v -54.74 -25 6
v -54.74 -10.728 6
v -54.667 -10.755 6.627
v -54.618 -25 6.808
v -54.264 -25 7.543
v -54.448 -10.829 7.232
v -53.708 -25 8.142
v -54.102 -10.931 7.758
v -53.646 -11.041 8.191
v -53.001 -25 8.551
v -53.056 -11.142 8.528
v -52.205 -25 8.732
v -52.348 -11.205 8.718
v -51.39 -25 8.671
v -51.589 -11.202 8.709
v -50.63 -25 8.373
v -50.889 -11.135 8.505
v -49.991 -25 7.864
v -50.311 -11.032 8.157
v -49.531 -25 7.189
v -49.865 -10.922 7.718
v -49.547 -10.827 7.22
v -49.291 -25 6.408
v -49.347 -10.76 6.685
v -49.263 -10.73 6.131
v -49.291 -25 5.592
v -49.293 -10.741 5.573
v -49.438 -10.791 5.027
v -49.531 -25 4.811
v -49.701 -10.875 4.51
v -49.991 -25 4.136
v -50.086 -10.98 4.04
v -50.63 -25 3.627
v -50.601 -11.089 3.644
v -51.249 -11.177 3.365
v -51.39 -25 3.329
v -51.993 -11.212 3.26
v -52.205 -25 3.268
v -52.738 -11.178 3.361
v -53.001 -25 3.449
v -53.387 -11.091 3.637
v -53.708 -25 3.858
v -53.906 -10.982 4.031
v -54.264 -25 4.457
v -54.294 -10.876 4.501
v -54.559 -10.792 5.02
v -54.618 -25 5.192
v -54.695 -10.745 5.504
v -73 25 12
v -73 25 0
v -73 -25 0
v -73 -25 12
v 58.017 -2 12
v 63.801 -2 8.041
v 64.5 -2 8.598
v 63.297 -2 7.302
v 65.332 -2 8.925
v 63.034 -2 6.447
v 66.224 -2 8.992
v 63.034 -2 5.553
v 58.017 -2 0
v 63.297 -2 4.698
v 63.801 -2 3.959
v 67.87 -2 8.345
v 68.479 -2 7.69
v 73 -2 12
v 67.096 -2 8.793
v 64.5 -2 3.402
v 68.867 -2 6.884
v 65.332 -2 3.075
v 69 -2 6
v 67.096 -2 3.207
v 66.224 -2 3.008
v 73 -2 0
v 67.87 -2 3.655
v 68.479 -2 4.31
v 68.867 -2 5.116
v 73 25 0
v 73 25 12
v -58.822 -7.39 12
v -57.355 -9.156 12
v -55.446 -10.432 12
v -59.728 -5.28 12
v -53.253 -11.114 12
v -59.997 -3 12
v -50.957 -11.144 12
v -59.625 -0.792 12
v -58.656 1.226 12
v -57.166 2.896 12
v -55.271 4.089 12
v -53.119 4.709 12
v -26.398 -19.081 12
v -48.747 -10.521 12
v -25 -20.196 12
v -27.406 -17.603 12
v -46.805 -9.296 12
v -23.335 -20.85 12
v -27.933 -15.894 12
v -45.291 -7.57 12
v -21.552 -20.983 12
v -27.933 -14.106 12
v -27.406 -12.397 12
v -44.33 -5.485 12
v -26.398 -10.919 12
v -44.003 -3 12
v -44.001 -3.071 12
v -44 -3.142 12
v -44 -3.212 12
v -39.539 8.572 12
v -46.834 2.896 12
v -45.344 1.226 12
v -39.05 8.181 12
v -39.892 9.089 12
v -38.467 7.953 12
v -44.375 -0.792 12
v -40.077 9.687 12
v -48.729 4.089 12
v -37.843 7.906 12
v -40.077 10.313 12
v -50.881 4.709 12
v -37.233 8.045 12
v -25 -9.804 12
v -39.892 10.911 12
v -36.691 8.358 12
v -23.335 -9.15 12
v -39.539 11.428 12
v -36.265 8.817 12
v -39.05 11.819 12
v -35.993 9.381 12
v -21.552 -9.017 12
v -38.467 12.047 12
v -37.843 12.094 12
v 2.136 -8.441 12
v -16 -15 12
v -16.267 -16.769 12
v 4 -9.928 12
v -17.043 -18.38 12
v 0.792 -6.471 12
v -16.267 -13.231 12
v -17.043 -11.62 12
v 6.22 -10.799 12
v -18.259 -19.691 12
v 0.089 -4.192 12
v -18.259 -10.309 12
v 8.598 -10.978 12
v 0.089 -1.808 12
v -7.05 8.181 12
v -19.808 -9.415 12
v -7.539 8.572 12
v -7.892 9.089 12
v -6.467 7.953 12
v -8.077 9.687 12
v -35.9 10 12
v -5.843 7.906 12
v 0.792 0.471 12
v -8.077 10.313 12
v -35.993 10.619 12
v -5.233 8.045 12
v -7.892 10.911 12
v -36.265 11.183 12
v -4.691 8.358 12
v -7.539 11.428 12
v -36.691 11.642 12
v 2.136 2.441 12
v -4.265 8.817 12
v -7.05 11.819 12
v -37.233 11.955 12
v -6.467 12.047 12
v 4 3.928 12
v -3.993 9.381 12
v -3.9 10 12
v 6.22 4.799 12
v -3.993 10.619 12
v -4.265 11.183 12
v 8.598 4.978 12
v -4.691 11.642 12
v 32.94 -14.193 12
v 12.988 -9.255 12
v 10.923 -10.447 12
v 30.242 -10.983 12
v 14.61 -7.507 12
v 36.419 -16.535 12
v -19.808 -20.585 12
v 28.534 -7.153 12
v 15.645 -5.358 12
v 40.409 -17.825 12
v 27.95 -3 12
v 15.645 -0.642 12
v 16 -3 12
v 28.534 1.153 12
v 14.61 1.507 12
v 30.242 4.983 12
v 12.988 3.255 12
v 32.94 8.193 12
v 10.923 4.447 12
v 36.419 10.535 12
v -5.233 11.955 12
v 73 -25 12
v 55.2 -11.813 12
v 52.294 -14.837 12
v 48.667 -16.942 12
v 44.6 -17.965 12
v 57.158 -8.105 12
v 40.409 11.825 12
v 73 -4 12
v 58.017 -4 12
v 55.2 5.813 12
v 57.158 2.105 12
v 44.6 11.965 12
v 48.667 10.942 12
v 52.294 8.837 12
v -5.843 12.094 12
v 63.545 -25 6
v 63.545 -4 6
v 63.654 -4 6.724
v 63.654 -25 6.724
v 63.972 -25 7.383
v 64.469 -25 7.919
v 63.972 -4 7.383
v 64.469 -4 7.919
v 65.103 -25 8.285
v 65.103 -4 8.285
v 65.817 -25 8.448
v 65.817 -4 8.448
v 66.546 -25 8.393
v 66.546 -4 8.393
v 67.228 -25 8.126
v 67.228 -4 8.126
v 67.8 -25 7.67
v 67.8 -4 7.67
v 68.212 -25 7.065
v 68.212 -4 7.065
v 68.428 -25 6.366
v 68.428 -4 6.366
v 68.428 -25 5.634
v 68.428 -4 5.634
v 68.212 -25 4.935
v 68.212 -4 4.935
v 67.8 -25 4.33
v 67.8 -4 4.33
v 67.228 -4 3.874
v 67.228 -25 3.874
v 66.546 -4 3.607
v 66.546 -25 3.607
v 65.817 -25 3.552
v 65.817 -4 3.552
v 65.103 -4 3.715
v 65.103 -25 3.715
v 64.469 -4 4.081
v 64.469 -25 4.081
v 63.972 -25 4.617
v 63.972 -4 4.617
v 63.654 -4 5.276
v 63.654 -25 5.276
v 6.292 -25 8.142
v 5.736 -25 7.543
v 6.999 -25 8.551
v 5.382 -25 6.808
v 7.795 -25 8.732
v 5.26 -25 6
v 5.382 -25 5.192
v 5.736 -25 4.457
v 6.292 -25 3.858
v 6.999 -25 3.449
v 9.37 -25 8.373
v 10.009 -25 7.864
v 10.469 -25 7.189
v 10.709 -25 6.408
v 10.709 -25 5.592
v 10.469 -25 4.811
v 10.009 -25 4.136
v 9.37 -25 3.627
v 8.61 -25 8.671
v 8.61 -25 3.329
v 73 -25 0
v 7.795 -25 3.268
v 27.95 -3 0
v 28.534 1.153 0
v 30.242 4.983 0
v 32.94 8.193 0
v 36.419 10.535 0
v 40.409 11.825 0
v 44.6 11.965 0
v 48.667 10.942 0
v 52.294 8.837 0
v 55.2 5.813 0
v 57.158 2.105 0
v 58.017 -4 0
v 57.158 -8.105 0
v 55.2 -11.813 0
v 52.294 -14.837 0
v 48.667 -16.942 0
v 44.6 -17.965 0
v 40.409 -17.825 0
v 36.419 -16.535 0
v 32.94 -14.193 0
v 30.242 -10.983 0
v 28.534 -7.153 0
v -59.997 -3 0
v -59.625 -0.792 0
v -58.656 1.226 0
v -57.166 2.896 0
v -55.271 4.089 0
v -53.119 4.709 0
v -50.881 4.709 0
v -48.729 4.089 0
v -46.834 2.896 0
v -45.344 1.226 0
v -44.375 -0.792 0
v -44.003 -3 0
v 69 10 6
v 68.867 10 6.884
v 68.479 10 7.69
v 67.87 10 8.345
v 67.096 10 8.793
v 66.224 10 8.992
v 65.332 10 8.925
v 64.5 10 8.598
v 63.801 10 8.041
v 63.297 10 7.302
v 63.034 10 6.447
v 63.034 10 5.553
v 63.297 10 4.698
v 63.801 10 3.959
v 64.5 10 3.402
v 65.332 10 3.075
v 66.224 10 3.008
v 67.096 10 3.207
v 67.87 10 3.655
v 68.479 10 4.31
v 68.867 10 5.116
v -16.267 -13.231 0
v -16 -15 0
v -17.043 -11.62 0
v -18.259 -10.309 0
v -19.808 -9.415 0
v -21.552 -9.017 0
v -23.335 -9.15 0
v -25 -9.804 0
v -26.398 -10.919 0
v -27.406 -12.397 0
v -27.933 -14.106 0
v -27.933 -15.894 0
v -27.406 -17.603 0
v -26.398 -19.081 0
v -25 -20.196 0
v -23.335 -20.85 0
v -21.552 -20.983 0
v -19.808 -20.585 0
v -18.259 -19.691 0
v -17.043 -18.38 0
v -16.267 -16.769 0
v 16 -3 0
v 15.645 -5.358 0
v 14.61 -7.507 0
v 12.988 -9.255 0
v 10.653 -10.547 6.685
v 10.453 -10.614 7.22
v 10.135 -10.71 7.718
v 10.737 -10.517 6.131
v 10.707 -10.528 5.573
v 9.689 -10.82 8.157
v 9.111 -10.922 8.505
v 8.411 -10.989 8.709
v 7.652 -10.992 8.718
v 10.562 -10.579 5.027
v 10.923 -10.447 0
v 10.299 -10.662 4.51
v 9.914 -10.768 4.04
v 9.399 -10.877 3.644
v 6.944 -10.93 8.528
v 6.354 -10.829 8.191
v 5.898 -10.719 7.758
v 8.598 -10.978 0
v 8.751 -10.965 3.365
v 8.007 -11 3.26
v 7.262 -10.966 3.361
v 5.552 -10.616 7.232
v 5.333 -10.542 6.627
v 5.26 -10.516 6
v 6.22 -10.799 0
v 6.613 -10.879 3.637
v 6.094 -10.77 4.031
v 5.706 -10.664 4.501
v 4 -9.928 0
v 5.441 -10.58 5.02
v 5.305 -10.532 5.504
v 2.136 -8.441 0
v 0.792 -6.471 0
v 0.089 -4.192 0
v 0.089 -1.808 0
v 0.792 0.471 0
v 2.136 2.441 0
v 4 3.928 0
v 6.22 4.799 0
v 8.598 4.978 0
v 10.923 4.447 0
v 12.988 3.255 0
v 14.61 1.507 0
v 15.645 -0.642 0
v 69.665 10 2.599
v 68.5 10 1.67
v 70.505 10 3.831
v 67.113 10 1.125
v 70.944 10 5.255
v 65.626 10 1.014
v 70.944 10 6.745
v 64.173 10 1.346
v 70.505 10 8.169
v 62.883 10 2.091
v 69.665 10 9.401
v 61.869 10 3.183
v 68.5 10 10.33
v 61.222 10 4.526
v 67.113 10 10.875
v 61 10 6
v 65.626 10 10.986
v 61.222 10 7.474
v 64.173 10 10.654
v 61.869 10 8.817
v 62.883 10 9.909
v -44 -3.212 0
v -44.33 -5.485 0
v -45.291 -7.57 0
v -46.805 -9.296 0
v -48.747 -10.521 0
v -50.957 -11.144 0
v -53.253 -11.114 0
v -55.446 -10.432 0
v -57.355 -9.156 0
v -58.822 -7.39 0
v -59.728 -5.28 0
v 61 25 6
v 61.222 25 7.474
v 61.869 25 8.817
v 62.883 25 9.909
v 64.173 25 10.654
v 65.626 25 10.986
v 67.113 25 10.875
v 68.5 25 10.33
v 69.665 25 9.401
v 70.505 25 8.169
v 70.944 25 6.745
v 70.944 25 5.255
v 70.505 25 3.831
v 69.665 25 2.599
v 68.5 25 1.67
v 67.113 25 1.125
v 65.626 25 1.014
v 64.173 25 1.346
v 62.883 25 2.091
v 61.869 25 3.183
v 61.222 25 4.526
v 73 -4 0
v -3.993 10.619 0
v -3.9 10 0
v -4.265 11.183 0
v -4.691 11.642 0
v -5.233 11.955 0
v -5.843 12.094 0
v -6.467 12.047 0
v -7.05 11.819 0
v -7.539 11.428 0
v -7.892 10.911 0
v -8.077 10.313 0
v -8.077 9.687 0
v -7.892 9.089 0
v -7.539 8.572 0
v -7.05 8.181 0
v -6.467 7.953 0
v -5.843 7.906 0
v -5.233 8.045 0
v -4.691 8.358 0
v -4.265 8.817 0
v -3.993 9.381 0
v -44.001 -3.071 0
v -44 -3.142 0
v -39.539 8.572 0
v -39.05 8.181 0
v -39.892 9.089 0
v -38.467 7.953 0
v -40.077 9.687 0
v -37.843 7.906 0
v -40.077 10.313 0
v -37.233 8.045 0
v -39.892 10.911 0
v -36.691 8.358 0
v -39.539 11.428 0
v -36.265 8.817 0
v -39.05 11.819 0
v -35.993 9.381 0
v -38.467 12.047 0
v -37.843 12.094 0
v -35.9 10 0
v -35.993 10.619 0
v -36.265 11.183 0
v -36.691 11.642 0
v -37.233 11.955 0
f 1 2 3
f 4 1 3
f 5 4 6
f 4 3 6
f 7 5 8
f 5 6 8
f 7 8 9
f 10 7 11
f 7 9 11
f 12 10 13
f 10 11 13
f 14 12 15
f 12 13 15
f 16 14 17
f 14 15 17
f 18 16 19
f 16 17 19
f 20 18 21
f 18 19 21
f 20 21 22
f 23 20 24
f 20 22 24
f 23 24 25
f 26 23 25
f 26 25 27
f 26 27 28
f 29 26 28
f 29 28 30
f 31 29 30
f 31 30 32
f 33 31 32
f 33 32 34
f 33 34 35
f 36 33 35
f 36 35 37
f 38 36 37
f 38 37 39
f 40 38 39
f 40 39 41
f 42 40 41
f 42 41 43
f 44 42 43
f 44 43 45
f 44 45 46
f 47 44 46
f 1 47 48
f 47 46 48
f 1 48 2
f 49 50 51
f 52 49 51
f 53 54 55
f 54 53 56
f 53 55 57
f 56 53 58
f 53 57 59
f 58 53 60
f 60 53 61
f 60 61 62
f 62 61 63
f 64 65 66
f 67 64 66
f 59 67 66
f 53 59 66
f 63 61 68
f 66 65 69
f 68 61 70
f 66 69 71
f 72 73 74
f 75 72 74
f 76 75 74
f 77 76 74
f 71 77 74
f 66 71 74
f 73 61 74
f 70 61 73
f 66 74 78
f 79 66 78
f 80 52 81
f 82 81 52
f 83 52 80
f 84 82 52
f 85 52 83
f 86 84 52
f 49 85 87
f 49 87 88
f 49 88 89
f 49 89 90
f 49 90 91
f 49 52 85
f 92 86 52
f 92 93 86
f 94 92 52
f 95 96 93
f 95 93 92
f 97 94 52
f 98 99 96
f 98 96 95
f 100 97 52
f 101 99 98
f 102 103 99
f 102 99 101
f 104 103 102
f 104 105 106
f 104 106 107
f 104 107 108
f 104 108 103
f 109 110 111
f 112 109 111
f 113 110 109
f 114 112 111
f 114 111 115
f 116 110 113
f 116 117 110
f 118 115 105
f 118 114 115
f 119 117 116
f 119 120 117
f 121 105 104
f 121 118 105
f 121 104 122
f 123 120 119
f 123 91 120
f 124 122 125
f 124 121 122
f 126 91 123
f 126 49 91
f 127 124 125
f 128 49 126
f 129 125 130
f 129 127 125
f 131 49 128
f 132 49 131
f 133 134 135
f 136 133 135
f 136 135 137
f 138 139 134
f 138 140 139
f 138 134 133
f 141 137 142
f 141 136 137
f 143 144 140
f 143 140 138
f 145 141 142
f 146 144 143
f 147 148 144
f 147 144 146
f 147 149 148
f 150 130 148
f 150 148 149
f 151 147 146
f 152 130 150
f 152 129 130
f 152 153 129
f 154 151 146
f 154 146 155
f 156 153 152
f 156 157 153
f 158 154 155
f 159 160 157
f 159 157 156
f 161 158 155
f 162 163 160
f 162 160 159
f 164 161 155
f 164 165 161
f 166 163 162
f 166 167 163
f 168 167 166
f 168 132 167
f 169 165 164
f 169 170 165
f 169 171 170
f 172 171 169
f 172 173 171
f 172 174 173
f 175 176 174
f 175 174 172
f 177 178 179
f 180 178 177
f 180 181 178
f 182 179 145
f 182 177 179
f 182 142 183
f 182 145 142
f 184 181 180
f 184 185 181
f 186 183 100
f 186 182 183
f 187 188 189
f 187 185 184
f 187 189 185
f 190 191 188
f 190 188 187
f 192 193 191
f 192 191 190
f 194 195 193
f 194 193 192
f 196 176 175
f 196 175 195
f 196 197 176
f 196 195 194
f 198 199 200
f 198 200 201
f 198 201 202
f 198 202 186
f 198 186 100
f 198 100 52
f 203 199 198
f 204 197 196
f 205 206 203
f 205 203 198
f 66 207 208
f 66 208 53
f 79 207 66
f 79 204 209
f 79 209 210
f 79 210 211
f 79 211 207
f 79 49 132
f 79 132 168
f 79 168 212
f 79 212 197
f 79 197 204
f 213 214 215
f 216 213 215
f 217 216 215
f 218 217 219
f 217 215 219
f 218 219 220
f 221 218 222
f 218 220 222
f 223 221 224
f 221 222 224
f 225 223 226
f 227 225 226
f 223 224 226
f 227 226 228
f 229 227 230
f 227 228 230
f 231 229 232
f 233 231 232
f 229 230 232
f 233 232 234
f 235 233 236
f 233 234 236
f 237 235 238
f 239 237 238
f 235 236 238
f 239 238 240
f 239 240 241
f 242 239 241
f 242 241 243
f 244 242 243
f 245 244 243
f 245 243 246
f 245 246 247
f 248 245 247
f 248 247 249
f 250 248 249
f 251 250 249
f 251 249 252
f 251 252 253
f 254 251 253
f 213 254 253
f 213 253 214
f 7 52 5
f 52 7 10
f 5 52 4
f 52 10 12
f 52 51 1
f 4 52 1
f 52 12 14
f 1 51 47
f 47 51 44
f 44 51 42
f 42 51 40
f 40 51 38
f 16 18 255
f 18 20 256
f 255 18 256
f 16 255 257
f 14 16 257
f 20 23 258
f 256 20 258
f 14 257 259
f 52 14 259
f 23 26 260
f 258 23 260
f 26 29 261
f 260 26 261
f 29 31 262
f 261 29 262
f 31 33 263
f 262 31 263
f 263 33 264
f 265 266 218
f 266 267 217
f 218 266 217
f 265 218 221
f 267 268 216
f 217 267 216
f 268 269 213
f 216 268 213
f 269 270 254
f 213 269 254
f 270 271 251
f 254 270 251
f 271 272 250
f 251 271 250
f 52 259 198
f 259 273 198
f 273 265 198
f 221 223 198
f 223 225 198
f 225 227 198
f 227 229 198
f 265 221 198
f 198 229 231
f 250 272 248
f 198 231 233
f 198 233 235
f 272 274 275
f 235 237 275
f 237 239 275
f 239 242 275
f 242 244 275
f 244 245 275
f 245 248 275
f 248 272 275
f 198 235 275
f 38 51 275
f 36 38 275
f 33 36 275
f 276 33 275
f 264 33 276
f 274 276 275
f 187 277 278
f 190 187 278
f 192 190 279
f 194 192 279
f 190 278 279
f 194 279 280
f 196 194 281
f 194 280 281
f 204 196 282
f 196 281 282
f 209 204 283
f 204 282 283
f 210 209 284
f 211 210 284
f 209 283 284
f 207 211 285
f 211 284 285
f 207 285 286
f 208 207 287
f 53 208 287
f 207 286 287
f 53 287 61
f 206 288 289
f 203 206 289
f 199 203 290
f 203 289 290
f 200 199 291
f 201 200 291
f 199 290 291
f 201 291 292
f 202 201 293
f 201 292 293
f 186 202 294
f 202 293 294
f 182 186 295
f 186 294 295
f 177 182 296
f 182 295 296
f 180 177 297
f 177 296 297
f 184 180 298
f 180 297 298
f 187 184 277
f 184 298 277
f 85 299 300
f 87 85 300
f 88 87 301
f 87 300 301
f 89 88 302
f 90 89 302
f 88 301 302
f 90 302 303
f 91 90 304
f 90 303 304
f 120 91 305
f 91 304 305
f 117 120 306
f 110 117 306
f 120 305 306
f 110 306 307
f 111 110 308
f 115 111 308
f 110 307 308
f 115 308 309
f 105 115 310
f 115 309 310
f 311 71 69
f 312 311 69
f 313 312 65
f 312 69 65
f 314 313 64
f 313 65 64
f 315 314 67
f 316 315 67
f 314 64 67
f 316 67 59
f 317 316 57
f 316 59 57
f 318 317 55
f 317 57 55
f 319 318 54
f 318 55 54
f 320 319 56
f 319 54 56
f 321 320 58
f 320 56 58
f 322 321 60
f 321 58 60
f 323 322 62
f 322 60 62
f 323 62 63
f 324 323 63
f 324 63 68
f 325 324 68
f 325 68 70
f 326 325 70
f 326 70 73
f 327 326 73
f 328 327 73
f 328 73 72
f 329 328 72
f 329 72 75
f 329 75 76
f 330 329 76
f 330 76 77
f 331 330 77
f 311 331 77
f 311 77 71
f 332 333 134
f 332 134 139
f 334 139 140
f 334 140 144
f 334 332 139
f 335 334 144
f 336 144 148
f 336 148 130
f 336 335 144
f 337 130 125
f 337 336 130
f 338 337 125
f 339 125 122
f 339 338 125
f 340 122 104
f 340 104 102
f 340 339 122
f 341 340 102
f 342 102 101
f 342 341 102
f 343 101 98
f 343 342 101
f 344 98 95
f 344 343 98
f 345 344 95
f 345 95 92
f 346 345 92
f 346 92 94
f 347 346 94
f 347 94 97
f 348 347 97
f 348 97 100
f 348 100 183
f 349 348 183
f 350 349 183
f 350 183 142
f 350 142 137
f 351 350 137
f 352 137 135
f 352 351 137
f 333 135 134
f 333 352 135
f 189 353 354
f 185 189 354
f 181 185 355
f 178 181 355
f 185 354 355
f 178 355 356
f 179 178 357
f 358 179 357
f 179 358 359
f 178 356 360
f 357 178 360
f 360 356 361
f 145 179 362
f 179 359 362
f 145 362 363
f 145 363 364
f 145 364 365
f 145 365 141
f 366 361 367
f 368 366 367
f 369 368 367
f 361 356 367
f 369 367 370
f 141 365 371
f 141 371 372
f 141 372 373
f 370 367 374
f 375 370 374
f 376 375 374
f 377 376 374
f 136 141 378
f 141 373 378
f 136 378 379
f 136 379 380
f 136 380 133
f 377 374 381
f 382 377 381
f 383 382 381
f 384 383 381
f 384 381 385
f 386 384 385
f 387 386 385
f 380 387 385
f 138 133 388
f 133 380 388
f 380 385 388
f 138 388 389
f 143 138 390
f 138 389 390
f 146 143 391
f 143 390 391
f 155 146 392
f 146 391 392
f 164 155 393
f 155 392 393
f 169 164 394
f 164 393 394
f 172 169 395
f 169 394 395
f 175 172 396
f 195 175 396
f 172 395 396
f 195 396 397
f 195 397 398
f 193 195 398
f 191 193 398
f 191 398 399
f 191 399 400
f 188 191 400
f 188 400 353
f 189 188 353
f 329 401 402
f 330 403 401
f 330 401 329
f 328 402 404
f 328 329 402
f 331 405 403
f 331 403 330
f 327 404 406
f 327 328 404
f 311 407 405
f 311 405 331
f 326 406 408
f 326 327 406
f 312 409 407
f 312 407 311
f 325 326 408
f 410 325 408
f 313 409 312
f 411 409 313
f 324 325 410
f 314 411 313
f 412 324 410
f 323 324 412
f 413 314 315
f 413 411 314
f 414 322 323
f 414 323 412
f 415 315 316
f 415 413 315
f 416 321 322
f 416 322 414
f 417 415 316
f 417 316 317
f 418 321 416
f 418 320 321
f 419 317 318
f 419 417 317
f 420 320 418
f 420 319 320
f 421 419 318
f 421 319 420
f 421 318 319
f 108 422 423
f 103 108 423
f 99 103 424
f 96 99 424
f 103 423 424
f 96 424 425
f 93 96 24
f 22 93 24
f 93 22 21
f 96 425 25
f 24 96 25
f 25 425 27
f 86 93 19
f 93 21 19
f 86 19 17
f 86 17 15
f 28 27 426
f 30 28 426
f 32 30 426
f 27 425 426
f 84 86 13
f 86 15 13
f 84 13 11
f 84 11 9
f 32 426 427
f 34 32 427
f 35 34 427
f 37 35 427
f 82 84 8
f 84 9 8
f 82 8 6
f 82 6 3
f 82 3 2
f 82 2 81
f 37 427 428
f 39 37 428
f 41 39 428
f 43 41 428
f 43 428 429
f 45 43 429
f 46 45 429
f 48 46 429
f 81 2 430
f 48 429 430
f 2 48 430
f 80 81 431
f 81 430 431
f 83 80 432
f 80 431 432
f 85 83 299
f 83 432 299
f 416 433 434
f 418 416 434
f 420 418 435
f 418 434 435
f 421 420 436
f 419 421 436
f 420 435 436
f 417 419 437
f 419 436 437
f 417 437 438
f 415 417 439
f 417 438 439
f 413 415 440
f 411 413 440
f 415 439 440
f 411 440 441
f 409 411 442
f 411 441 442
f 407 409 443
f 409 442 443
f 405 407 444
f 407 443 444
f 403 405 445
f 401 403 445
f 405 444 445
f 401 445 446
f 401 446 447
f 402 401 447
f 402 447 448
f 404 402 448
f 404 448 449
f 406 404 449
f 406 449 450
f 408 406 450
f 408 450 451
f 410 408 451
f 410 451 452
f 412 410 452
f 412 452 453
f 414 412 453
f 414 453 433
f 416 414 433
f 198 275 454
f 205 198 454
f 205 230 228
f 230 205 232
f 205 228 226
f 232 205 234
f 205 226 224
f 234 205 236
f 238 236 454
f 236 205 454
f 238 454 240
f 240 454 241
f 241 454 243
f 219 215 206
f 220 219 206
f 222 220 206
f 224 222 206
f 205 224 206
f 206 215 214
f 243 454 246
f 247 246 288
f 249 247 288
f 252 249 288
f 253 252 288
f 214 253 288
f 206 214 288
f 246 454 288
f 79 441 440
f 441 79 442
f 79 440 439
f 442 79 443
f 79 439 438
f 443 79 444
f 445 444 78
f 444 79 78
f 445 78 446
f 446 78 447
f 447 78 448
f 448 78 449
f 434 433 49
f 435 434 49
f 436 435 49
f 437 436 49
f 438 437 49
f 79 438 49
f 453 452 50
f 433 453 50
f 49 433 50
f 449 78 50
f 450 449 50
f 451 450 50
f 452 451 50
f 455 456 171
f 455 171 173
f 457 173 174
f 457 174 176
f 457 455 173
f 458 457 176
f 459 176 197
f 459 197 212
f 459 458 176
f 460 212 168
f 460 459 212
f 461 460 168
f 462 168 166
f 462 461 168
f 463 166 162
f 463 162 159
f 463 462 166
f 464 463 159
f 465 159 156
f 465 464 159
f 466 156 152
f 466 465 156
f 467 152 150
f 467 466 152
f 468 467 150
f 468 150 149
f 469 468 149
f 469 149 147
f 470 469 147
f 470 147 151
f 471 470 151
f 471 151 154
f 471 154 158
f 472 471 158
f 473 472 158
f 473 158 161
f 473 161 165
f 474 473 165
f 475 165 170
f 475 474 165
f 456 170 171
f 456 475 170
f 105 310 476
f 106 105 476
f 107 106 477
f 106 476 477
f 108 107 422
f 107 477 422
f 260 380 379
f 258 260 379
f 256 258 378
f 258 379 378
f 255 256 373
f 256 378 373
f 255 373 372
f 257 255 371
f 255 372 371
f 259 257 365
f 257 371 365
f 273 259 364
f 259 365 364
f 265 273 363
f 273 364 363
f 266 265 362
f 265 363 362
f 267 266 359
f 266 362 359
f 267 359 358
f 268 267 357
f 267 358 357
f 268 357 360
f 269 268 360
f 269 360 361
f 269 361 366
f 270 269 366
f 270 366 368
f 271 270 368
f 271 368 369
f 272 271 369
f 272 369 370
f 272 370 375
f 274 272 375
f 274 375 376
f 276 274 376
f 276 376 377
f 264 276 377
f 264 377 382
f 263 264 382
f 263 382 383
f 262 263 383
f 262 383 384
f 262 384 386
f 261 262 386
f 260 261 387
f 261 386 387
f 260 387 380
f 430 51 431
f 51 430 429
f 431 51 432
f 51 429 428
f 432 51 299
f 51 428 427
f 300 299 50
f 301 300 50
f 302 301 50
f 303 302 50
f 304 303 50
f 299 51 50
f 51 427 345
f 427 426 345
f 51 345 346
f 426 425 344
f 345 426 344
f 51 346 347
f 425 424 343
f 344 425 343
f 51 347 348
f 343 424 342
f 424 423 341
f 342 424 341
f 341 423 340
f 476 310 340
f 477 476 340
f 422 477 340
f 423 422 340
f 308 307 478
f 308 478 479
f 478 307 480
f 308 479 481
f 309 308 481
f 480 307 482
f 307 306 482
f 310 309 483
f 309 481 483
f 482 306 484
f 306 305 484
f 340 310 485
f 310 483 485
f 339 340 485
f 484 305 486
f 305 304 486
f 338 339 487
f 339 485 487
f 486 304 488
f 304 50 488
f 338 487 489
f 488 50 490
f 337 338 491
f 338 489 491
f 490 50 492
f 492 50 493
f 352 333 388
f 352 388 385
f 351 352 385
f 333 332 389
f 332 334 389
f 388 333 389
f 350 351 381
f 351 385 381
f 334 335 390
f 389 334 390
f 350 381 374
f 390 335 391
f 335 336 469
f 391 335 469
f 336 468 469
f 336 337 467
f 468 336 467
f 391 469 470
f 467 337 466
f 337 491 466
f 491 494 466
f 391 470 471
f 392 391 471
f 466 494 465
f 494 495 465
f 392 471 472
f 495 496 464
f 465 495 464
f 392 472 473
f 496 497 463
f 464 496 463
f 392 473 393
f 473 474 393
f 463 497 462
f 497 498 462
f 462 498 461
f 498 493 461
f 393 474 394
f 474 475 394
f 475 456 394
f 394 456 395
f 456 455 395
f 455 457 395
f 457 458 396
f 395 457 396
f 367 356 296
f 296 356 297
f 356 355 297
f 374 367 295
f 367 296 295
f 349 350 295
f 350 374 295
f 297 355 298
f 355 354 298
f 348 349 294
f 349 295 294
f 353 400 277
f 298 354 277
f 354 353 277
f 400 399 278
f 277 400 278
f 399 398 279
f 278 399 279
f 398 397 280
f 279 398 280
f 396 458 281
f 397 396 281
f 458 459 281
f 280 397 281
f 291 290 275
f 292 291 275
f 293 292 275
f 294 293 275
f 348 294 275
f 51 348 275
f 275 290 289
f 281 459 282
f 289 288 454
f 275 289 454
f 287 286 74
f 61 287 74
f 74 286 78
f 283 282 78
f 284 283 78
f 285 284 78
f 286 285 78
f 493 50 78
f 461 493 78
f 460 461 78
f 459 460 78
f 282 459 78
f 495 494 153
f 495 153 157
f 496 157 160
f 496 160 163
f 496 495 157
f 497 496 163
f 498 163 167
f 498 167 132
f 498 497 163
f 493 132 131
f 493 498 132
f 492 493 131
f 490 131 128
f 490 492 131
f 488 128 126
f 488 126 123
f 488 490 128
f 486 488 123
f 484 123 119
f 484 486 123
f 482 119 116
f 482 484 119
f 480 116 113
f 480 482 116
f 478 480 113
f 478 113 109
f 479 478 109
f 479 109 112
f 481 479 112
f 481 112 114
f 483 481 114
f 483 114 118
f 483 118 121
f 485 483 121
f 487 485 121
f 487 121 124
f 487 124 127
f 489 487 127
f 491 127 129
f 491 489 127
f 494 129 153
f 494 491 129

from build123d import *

# Parameters (mm, degrees)
F0_R           = 2.1
F0_R_2         = 6
F1_DEPTH       = 12
F3_D           = 4.91
F3_DEPTH       = 27
F5_D           = 6
F5_DEPTH       = 27
F5_CBORE_D     = 10
F5_CBORE_DEPTH = 15
F7_D           = 5.48
F7_DEPTH       = 20


with BuildPart() as f1:
    # F0 (on Top) → F1 (new body)
    with BuildSketch(Plane.XY):
        with BuildLine():
            Line((-73, 25), (-73, -3))
            Line((-73, -3), (-59.997182, -3))
            ThreePointArc((-59.997182, -3), (-52, 4.787677), (-44.002818, -3))
            Line((-44.002818, -3), (0, -3))
            ThreePointArc((0, -3), (8, 5), (16, -3))
            Line((16, -3), (27.95, -3))
            ThreePointArc((27.95, -3), (42.499724, 12.041683), (58.016741, -2))
            Line((58.016741, -2), (73, -2))
            Line((73, -2), (73, 25))
            Line((73, 25), (-73, 25))
        make_face()
        with Locations((-38, 10)):
            Circle(F0_R, mode=Mode.SUBTRACT)
        with Locations((-6, 10)):
            Circle(F0_R, mode=Mode.SUBTRACT)
        with BuildLine():
            Line((-73, -25), (73, -25))
            Line((73, -25), (73, -4))
            Line((73, -4), (58.016741, -4))
            ThreePointArc((58.016741, -4), (42.499724, -18.041683), (27.95, -3))
            Line((27.95, -3), (16, -3))
            ThreePointArc((16, -3), (8, -11), (0, -3))
            Line((0, -3), (-44.002818, -3))
            ThreePointArc((-44.002818, -3), (-44.000705, -3.106152), (-44, -3.212323))
            ThreePointArc((-44, -3.212323), (-52.106171, -11.211619), (-59.997182, -3))
            Line((-59.997182, -3), (-73, -3))
            Line((-73, -3), (-73, -25))
        make_face()
        with Locations((-22, -15)):
            Circle(F0_R_2, mode=Mode.SUBTRACT)
    extrude(amount=F1_DEPTH)

    # F3
    with Locations(Plane.XZ.offset(25)):
        with Locations((66, 6)):
            Hole(F3_D / 2, depth=F3_DEPTH)

    # F5
    with Locations(Plane(origin=(0, 25, 0), x_dir=(-1, 0, 0), z_dir=(0, 1, 0))):
        with Locations((-66, 6)):
            CounterBoreHole(F5_D / 2, F5_CBORE_D / 2, F5_CBORE_DEPTH, depth=F5_DEPTH)

    # F7
    with Locations(Plane.XZ.offset(25)):
        with Locations((-52, 6), (8, 6)):
            Hole(F7_D / 2, depth=F7_DEPTH)


solid = f1.part
